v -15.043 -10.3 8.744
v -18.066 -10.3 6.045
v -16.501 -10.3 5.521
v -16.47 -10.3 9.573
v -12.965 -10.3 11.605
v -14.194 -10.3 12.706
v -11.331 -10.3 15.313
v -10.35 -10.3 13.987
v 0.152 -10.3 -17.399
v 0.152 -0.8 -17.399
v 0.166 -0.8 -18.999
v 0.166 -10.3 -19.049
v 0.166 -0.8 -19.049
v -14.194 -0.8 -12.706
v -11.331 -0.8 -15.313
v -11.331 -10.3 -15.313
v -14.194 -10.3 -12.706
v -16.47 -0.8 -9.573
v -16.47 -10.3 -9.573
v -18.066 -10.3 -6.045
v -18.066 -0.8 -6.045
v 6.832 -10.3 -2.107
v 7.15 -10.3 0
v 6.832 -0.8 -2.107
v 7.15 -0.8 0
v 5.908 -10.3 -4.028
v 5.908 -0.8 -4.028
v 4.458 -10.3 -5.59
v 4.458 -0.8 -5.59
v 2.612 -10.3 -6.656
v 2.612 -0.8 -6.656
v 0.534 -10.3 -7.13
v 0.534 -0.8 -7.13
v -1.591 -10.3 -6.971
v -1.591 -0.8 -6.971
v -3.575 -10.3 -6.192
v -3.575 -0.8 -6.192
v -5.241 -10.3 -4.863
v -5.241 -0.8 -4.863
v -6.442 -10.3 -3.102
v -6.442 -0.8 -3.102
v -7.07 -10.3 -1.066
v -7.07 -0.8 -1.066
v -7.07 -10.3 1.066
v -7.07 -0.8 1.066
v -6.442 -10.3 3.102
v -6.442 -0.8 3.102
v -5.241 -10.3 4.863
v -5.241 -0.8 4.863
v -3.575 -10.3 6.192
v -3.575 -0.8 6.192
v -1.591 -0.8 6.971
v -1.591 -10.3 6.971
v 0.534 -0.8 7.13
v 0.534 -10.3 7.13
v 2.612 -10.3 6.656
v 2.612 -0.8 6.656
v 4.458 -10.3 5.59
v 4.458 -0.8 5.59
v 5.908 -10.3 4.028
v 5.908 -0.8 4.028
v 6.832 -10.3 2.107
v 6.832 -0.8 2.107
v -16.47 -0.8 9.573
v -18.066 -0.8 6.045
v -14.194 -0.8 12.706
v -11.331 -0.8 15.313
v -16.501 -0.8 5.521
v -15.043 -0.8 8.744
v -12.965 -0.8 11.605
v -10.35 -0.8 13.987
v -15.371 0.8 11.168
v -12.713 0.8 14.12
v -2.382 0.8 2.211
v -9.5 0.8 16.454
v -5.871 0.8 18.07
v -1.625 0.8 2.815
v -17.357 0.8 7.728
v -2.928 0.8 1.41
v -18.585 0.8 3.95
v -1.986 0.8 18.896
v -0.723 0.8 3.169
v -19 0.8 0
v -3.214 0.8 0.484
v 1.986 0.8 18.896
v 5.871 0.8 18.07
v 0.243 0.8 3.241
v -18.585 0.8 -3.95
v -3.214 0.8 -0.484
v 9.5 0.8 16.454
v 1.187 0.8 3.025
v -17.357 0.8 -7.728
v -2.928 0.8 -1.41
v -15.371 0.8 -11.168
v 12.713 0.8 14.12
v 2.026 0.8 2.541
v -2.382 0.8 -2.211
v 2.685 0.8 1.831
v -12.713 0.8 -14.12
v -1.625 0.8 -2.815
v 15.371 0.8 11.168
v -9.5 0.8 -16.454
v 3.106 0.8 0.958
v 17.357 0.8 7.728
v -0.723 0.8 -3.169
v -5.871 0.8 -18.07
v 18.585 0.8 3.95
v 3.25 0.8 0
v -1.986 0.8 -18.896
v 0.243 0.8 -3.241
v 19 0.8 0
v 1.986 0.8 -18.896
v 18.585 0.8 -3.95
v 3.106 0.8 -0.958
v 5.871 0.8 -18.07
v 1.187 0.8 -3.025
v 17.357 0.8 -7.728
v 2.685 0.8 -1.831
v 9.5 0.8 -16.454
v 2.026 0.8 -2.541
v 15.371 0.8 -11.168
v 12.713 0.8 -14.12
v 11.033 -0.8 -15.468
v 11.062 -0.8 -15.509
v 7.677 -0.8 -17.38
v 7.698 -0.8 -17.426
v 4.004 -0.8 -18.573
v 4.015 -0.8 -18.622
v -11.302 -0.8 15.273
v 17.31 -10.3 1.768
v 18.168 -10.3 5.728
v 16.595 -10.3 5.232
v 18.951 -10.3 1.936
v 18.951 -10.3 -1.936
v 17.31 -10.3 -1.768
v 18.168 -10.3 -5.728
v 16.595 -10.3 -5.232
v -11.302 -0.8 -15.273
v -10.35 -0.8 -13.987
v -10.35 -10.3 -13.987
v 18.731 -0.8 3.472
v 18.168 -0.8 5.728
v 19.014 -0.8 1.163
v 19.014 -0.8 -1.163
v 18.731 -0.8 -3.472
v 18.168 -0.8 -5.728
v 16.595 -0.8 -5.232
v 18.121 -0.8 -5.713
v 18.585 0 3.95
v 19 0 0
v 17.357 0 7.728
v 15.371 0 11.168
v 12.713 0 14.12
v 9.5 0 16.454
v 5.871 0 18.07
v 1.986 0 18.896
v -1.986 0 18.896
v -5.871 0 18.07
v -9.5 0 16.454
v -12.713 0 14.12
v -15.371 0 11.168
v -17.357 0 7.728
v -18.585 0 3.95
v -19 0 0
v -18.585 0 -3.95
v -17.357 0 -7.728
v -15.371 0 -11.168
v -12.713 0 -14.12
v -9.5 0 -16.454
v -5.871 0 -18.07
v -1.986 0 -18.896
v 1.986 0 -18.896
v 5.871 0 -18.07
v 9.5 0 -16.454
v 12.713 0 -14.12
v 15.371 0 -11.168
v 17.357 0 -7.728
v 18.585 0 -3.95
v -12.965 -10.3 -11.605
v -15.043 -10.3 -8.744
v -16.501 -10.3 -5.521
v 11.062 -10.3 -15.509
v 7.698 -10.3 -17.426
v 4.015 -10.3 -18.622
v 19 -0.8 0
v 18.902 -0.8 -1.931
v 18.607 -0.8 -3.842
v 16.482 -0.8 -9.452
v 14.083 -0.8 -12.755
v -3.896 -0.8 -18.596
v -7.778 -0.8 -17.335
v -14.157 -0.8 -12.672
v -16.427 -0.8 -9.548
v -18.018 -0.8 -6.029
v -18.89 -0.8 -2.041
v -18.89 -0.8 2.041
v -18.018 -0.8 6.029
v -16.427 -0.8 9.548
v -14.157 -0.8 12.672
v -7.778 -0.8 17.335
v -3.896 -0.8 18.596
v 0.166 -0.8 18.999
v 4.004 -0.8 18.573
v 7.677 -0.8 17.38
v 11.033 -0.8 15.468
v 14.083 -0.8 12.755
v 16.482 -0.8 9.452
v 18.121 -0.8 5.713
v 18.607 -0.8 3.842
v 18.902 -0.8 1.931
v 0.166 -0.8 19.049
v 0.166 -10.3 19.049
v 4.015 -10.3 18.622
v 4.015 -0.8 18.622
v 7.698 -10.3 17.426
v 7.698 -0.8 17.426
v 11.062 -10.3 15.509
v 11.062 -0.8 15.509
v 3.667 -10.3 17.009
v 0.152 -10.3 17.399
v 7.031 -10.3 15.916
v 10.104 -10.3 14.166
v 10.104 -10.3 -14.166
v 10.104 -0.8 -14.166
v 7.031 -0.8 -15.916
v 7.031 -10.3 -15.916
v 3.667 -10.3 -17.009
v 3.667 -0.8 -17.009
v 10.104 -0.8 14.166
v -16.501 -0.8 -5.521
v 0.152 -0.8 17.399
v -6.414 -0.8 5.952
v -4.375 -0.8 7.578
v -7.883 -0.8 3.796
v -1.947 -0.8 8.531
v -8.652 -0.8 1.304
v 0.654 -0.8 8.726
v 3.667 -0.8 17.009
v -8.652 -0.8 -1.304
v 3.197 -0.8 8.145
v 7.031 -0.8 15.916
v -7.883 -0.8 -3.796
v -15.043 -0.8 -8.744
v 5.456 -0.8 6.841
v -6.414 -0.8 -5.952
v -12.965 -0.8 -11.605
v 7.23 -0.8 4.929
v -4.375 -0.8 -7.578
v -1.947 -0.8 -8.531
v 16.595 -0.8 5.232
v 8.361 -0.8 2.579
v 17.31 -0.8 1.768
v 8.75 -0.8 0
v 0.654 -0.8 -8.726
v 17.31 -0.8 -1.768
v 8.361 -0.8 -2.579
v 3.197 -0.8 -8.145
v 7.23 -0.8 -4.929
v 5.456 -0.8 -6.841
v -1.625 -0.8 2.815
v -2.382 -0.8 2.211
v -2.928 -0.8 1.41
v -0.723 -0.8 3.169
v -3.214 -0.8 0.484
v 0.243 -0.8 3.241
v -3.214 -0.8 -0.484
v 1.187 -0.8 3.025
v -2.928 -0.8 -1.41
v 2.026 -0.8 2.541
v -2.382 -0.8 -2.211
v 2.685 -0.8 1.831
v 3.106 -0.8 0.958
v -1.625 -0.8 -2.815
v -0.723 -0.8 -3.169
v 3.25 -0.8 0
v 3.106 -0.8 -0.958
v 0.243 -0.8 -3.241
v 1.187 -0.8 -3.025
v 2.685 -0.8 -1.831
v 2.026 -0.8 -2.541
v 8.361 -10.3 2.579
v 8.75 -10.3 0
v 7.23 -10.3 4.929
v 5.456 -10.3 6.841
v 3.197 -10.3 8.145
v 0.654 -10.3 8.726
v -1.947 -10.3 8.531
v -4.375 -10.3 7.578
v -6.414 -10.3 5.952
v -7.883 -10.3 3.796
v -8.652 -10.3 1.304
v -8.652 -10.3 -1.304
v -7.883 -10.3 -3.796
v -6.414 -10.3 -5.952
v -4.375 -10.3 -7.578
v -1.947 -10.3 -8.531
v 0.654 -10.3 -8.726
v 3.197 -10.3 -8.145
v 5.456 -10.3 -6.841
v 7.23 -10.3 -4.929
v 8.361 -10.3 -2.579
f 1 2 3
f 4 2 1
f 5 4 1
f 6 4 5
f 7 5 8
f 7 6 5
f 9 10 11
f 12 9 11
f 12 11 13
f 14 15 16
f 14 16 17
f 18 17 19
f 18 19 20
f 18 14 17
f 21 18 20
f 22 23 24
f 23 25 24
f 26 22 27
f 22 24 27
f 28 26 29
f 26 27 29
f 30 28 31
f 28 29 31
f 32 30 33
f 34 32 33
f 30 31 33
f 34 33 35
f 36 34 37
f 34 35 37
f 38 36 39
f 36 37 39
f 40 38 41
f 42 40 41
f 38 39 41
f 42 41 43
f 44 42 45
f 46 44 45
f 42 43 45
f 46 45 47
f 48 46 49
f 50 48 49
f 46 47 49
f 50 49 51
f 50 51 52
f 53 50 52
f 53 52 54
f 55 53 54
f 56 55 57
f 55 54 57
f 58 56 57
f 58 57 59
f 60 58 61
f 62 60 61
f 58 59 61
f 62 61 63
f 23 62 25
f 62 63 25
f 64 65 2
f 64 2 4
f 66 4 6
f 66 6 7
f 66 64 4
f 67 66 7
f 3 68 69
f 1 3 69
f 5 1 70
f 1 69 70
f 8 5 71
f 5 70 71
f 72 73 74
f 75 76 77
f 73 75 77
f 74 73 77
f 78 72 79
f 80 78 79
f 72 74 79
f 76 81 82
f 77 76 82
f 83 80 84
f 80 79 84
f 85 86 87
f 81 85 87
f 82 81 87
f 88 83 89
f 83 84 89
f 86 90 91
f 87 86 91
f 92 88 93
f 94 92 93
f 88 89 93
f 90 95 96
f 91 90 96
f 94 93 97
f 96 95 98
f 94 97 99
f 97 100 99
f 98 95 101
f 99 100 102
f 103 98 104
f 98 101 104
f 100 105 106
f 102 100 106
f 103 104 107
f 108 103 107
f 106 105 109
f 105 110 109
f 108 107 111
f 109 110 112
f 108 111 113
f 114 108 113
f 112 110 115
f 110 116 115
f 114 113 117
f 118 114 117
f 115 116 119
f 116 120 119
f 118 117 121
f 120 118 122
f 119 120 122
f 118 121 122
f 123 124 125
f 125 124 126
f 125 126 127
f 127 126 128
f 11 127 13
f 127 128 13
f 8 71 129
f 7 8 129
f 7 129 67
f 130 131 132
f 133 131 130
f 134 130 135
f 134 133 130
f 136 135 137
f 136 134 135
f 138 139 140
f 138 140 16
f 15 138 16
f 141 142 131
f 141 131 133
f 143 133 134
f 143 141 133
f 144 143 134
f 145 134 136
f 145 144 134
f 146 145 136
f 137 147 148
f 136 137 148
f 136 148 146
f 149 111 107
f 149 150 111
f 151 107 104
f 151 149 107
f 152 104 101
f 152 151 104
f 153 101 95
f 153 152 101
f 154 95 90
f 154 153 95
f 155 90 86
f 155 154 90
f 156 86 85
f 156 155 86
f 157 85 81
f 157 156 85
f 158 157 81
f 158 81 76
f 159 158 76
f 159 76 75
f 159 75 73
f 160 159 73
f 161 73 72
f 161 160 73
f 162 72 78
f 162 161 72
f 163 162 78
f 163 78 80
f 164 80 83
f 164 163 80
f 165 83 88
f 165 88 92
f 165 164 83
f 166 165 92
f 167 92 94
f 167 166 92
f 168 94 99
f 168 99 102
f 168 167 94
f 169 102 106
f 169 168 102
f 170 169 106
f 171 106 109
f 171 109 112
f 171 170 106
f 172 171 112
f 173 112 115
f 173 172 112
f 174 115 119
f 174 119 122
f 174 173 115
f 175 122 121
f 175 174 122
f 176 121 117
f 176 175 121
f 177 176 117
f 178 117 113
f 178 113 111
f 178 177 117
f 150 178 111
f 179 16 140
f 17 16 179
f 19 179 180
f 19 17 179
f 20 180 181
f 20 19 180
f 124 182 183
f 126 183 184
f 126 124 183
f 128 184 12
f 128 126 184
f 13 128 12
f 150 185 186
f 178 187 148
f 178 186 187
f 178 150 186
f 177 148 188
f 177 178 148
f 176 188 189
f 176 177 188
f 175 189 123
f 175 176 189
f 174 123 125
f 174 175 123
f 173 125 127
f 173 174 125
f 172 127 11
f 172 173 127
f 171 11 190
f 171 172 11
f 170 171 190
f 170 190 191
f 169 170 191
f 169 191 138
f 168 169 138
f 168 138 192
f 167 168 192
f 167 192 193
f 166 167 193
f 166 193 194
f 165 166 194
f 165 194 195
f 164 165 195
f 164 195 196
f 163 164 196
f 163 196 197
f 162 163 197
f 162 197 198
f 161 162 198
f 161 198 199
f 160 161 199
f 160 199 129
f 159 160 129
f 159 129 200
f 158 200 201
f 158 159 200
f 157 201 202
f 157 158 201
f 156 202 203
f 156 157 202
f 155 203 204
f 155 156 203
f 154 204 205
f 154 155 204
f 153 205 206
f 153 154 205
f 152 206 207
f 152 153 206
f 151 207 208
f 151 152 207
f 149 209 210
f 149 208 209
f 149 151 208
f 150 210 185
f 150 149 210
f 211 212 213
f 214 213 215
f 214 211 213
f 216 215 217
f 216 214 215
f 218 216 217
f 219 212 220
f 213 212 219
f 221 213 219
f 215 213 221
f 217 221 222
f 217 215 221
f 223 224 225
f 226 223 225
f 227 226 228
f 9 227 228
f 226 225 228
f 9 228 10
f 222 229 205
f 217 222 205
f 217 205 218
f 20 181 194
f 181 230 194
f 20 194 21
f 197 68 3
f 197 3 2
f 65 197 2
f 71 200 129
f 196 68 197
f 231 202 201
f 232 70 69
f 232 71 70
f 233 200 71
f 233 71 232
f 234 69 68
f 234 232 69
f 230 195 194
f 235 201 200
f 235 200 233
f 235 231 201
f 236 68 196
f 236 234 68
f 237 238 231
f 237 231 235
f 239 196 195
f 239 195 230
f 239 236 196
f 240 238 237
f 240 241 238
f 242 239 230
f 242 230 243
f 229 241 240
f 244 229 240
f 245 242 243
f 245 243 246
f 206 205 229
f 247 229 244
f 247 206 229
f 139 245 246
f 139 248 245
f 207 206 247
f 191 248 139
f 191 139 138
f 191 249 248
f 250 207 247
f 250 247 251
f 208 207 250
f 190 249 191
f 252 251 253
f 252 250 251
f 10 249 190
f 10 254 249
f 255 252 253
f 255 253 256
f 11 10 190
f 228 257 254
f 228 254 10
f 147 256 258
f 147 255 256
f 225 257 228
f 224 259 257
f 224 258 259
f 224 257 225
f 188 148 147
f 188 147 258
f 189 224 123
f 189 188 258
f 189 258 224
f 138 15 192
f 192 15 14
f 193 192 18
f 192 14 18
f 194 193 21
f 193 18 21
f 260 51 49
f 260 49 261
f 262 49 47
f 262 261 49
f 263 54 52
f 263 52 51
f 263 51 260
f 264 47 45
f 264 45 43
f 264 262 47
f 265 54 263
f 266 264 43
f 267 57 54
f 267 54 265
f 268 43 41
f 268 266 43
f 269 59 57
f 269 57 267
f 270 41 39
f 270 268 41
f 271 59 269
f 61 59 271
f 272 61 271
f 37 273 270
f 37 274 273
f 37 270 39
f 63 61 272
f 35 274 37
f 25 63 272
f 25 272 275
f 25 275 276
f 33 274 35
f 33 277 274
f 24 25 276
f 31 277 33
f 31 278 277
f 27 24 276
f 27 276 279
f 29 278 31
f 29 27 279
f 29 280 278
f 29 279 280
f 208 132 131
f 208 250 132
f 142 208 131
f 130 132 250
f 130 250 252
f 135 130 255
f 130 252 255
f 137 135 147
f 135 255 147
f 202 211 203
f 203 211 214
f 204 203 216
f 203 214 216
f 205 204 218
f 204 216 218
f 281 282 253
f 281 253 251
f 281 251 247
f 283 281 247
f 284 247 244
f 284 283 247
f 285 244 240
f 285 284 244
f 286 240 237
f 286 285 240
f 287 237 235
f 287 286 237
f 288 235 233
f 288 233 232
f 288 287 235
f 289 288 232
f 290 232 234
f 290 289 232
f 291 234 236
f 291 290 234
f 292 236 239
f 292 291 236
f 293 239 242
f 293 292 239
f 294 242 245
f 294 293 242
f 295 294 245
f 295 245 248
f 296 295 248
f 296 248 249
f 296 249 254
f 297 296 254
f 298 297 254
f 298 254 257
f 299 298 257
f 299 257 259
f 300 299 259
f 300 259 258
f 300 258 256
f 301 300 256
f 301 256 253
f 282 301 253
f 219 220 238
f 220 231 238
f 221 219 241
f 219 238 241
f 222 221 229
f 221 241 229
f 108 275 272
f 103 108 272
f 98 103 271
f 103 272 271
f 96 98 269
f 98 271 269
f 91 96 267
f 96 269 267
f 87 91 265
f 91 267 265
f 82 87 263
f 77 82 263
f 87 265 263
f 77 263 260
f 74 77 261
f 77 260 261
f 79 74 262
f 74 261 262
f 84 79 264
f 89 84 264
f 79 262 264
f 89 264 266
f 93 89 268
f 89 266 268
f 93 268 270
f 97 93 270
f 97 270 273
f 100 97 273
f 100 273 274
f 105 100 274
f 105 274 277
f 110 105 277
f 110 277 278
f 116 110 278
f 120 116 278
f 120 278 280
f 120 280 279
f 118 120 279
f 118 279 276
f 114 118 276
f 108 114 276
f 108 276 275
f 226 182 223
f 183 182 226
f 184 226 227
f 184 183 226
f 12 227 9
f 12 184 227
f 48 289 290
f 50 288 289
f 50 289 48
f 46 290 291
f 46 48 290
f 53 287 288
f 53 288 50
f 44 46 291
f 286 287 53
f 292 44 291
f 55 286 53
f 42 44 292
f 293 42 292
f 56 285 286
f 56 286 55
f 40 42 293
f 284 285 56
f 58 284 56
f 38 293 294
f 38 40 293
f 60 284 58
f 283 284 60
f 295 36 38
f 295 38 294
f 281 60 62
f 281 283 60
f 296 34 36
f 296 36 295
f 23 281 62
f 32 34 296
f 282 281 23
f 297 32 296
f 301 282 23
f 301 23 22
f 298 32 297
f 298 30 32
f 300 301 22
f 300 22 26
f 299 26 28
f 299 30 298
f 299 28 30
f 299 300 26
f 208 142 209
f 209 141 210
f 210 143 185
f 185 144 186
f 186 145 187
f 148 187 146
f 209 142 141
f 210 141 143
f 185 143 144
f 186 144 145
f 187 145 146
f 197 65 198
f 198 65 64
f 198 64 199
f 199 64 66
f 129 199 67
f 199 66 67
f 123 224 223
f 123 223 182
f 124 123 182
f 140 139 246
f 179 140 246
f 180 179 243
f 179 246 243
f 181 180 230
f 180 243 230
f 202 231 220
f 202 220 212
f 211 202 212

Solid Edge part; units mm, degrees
sketch "Sketch1" plane through (0, 0, 0) normal (0, -1, 0) x (1, 0, 0)
  circle A0 centre (0, 0) radius 19
  dimension "D1" = 38
extrude "Protrusion1" add sketch "Sketch1" along normal mid plane 1.6
sketch "Sketch2" plane through (0, -0.8, 0) normal (0, -1, 0) x (1, 0, 0)
  line L0 (16.5947, -5.2323) -> (18.1683, -5.7284)
  arc A0 (18.1683, 5.7284) -> (18.1683, -5.7284) centre (0, 0) cw
  line L1 (16.5947, 5.2323) -> (18.1683, 5.7284)
  arc A1 (16.5947, 5.2323) -> (16.5947, -5.2323) centre (0, 0) cw
  dimension "D1" = 1.6
extrude "Protrusion2" add sketch "Sketch2" along normal blind 9.5
pattern_circular "Pattern1" count 5 over 360 about axis through (0, -0.8, 0) along (0, 1, 0) of "Protrusion2"
sketch "Sketch3" plane through (-14.2263, -10.3, -10.4272) normal (0, -1, 0) x (1, 0, 0)
  circle A0 centre (14.2263, 10.4272) radius 8.75
  dimension "D1" = 17.5
extrude "Protrusion7" add sketch "Sketch3" against normal up to next
sketch "Sketch4" plane through (-0.4408, -0.8, 0) normal (0, -1, 0) x (1, 0, 0)
  circle A0 centre (0.4408, 0) radius 7.15
  dimension "D1" = 1.6
extrude "Cutout1" cut sketch "Sketch4" along normal through all
sketch "Sketch5" plane through (0, -0.8, 0) normal (0, -1, 0) x (1, 0, 0)
  circle A0 centre (0, 0) radius 3.25
  dimension "D1" = 6.5
extrude "Cutout2" cut sketch "Sketch5" against normal through all
properties part number "C-101-1" material "STEEL, GALVANIZED"
